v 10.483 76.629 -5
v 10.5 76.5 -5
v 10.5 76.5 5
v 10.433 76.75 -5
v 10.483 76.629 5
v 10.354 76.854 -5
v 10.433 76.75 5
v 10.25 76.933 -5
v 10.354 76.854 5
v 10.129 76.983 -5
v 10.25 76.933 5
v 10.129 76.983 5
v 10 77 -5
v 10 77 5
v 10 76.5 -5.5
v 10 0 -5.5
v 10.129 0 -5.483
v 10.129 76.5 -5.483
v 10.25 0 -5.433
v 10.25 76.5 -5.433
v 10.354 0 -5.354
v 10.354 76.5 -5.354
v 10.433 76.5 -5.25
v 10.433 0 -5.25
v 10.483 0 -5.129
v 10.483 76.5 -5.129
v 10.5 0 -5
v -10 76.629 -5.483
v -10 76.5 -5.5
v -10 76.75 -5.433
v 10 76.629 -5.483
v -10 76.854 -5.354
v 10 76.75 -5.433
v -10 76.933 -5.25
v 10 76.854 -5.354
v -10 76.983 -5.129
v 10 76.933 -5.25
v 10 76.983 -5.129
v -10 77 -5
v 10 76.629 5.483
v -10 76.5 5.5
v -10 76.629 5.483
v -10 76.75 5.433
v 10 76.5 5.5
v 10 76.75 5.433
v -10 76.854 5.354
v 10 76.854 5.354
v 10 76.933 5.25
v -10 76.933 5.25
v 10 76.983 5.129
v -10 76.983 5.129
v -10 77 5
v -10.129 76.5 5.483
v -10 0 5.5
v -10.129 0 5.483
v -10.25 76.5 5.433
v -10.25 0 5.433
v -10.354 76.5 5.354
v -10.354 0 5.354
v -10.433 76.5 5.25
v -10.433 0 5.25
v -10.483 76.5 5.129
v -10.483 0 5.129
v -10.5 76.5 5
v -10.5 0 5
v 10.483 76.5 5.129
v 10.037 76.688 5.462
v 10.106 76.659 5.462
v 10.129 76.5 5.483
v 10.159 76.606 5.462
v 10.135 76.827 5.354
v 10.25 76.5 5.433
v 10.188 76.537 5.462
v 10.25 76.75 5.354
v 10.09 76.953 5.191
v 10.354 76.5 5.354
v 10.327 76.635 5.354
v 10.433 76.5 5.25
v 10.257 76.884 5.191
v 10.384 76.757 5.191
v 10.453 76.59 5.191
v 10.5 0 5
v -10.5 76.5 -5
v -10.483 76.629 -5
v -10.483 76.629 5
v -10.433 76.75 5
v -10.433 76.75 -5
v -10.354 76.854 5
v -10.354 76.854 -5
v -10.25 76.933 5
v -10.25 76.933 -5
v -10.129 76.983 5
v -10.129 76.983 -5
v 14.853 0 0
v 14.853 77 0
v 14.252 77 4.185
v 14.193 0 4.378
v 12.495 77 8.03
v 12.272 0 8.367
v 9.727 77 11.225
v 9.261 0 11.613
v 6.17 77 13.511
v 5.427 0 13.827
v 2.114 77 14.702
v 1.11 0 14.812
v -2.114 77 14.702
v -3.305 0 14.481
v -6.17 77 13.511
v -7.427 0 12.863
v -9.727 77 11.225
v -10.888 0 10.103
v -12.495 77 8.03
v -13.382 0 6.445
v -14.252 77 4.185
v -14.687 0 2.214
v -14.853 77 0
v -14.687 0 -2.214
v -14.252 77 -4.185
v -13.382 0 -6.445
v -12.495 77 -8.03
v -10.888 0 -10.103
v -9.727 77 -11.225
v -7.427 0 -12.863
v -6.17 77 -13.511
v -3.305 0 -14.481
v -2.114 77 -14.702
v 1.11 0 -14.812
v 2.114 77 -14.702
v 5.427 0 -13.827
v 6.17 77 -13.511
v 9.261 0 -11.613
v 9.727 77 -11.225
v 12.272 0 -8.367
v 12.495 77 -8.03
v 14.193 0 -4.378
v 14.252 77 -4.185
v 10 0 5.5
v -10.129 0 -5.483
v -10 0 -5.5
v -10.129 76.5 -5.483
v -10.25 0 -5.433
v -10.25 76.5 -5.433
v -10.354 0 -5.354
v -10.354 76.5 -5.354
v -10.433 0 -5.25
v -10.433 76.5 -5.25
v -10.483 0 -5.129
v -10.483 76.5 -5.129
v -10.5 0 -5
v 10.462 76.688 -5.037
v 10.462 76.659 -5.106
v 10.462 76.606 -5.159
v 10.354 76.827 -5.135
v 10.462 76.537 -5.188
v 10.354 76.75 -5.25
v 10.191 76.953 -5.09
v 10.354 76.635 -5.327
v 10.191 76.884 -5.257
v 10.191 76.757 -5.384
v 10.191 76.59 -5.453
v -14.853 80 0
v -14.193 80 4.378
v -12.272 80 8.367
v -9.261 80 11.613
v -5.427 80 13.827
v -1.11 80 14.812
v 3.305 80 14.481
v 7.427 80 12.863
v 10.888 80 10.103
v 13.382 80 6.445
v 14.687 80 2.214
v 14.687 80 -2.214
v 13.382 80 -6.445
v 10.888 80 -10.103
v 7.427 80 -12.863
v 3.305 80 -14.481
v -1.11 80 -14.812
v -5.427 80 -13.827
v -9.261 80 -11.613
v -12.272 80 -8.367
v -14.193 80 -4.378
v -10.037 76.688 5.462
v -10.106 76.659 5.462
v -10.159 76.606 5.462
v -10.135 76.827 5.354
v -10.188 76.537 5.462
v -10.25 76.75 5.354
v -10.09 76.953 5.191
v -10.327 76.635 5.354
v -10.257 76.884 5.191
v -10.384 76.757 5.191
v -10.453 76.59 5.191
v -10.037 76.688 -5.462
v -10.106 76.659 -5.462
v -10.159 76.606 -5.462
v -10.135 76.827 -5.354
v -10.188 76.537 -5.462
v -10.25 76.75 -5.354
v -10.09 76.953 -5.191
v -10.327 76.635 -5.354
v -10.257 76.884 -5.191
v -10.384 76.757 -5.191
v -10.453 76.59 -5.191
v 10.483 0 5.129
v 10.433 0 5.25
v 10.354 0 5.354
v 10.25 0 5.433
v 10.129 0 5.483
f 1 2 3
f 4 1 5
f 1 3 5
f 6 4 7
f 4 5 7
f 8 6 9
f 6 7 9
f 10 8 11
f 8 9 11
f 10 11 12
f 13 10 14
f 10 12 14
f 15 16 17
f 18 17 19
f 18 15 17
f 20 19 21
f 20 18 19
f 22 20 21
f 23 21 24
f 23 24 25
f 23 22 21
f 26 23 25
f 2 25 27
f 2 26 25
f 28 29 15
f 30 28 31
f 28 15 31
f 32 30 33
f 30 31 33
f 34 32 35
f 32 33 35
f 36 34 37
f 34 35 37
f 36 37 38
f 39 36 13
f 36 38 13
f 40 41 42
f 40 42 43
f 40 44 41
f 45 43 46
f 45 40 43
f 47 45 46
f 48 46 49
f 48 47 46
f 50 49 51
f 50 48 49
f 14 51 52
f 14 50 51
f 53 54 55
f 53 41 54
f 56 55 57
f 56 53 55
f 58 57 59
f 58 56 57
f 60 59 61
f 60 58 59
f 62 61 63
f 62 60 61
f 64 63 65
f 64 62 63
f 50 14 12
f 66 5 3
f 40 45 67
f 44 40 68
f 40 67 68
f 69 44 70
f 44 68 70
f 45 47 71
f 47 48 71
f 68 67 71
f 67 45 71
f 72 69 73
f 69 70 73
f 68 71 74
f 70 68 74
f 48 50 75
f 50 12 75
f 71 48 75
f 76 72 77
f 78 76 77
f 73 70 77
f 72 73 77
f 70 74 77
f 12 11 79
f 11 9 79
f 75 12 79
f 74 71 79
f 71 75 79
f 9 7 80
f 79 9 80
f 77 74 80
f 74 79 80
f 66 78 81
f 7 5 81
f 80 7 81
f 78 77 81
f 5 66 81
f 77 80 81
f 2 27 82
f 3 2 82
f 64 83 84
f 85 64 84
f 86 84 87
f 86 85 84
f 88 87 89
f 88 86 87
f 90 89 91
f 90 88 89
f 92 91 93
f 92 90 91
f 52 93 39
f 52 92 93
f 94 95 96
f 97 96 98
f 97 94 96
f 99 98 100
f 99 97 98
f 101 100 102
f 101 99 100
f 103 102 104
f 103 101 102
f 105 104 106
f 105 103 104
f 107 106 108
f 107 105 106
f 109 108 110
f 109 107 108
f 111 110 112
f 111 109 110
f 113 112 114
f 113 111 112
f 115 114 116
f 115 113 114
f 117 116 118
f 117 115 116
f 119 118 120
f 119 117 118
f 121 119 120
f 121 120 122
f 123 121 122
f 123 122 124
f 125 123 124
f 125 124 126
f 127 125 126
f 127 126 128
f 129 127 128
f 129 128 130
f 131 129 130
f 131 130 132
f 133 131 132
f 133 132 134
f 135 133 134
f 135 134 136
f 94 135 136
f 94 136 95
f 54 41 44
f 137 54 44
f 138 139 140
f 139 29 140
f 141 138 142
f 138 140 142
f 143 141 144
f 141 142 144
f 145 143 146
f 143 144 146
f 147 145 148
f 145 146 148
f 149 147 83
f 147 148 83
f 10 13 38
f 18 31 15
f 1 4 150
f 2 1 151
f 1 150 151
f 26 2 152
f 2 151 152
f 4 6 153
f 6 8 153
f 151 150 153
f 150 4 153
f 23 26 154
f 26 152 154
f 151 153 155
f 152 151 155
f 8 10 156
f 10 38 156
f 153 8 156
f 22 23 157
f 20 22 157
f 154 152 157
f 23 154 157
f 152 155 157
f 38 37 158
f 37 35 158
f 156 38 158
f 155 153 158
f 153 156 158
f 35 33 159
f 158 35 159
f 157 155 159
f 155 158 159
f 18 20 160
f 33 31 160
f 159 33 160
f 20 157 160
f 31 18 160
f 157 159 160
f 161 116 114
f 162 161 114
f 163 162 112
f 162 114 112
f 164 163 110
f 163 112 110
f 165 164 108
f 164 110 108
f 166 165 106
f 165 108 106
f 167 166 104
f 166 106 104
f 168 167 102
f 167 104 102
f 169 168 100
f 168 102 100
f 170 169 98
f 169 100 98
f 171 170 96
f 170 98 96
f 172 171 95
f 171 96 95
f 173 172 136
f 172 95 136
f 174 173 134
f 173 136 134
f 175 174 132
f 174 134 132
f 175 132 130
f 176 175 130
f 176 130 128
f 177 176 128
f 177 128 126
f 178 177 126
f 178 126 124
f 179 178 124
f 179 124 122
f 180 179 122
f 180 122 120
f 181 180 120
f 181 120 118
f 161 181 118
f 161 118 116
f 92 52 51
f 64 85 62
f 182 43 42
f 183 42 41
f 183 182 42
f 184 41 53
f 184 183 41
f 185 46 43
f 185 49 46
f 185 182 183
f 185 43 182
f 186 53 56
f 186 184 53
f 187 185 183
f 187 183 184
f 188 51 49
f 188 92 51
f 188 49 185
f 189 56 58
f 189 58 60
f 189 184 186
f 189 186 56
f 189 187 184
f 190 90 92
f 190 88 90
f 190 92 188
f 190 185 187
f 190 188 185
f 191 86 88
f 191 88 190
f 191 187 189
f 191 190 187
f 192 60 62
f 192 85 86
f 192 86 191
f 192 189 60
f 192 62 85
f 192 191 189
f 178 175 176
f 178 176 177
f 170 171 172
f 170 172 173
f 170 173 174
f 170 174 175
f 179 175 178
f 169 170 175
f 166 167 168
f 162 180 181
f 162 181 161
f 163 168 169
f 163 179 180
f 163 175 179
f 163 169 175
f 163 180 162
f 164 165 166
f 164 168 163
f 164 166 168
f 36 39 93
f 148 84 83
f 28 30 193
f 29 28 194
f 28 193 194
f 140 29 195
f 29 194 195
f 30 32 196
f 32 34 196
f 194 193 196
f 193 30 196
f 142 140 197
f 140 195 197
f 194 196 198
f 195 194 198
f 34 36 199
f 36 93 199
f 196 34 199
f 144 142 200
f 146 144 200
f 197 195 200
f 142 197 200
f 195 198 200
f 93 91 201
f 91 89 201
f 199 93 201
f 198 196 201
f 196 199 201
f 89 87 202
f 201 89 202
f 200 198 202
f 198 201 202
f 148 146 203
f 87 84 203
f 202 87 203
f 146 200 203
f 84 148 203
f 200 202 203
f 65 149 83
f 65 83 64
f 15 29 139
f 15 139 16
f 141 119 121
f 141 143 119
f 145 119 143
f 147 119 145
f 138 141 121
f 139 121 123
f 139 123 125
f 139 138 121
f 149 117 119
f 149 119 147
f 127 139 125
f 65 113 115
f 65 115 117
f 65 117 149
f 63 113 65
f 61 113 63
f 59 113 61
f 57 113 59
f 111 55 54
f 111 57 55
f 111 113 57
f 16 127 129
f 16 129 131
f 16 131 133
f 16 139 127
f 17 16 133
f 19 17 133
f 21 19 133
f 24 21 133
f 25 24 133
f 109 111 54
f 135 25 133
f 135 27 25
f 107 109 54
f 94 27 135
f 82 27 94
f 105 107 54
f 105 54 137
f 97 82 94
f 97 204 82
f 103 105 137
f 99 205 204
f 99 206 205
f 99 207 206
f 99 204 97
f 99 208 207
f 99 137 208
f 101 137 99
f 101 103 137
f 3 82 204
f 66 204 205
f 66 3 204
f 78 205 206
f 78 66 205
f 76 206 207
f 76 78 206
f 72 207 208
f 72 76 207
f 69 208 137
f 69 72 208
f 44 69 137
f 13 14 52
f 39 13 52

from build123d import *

# Parameters (mm, degrees)
F3_R     = 14.8532695911
F3_W     = 21
F3_H     = 11
F4_DEPTH = 77
F5_R     = 14.8532695911
F6_DEPTH = 3
F7_R     = 0.5


with BuildPart() as f4:
    # F3 (on Front) → F4 (new body)
    with BuildSketch(Plane.XZ):
        Circle(F3_R)
        Rectangle(F3_W, F3_H, mode=Mode.SUBTRACT)
    extrude(amount=-F4_DEPTH)

    # F5 (on face) → F6 (join)
    with BuildSketch(Plane(origin=(0, 77, 0), x_dir=(-1, 0, 0), z_dir=(0, 1, 0))):
        Circle(F5_R)
    extrude(amount=F6_DEPTH)

    # F7
    f7_edges = [f4.edges().sort_by_distance(p)[0] for p in [
        (-10.5, 77, 0),
        (0, 77, -5.5),
        (10.5, 77, 0),
        (0, 77, 5.5),
        (-10.5, 38.5, -5.5),
        (-10.5, 38.5, 5.5),
        (10.5, 38.5, 5.5),
        (10.5, 38.5, -5.5),
    ]]
    fillet(f7_edges, radius=F7_R)


solid = f4.part
